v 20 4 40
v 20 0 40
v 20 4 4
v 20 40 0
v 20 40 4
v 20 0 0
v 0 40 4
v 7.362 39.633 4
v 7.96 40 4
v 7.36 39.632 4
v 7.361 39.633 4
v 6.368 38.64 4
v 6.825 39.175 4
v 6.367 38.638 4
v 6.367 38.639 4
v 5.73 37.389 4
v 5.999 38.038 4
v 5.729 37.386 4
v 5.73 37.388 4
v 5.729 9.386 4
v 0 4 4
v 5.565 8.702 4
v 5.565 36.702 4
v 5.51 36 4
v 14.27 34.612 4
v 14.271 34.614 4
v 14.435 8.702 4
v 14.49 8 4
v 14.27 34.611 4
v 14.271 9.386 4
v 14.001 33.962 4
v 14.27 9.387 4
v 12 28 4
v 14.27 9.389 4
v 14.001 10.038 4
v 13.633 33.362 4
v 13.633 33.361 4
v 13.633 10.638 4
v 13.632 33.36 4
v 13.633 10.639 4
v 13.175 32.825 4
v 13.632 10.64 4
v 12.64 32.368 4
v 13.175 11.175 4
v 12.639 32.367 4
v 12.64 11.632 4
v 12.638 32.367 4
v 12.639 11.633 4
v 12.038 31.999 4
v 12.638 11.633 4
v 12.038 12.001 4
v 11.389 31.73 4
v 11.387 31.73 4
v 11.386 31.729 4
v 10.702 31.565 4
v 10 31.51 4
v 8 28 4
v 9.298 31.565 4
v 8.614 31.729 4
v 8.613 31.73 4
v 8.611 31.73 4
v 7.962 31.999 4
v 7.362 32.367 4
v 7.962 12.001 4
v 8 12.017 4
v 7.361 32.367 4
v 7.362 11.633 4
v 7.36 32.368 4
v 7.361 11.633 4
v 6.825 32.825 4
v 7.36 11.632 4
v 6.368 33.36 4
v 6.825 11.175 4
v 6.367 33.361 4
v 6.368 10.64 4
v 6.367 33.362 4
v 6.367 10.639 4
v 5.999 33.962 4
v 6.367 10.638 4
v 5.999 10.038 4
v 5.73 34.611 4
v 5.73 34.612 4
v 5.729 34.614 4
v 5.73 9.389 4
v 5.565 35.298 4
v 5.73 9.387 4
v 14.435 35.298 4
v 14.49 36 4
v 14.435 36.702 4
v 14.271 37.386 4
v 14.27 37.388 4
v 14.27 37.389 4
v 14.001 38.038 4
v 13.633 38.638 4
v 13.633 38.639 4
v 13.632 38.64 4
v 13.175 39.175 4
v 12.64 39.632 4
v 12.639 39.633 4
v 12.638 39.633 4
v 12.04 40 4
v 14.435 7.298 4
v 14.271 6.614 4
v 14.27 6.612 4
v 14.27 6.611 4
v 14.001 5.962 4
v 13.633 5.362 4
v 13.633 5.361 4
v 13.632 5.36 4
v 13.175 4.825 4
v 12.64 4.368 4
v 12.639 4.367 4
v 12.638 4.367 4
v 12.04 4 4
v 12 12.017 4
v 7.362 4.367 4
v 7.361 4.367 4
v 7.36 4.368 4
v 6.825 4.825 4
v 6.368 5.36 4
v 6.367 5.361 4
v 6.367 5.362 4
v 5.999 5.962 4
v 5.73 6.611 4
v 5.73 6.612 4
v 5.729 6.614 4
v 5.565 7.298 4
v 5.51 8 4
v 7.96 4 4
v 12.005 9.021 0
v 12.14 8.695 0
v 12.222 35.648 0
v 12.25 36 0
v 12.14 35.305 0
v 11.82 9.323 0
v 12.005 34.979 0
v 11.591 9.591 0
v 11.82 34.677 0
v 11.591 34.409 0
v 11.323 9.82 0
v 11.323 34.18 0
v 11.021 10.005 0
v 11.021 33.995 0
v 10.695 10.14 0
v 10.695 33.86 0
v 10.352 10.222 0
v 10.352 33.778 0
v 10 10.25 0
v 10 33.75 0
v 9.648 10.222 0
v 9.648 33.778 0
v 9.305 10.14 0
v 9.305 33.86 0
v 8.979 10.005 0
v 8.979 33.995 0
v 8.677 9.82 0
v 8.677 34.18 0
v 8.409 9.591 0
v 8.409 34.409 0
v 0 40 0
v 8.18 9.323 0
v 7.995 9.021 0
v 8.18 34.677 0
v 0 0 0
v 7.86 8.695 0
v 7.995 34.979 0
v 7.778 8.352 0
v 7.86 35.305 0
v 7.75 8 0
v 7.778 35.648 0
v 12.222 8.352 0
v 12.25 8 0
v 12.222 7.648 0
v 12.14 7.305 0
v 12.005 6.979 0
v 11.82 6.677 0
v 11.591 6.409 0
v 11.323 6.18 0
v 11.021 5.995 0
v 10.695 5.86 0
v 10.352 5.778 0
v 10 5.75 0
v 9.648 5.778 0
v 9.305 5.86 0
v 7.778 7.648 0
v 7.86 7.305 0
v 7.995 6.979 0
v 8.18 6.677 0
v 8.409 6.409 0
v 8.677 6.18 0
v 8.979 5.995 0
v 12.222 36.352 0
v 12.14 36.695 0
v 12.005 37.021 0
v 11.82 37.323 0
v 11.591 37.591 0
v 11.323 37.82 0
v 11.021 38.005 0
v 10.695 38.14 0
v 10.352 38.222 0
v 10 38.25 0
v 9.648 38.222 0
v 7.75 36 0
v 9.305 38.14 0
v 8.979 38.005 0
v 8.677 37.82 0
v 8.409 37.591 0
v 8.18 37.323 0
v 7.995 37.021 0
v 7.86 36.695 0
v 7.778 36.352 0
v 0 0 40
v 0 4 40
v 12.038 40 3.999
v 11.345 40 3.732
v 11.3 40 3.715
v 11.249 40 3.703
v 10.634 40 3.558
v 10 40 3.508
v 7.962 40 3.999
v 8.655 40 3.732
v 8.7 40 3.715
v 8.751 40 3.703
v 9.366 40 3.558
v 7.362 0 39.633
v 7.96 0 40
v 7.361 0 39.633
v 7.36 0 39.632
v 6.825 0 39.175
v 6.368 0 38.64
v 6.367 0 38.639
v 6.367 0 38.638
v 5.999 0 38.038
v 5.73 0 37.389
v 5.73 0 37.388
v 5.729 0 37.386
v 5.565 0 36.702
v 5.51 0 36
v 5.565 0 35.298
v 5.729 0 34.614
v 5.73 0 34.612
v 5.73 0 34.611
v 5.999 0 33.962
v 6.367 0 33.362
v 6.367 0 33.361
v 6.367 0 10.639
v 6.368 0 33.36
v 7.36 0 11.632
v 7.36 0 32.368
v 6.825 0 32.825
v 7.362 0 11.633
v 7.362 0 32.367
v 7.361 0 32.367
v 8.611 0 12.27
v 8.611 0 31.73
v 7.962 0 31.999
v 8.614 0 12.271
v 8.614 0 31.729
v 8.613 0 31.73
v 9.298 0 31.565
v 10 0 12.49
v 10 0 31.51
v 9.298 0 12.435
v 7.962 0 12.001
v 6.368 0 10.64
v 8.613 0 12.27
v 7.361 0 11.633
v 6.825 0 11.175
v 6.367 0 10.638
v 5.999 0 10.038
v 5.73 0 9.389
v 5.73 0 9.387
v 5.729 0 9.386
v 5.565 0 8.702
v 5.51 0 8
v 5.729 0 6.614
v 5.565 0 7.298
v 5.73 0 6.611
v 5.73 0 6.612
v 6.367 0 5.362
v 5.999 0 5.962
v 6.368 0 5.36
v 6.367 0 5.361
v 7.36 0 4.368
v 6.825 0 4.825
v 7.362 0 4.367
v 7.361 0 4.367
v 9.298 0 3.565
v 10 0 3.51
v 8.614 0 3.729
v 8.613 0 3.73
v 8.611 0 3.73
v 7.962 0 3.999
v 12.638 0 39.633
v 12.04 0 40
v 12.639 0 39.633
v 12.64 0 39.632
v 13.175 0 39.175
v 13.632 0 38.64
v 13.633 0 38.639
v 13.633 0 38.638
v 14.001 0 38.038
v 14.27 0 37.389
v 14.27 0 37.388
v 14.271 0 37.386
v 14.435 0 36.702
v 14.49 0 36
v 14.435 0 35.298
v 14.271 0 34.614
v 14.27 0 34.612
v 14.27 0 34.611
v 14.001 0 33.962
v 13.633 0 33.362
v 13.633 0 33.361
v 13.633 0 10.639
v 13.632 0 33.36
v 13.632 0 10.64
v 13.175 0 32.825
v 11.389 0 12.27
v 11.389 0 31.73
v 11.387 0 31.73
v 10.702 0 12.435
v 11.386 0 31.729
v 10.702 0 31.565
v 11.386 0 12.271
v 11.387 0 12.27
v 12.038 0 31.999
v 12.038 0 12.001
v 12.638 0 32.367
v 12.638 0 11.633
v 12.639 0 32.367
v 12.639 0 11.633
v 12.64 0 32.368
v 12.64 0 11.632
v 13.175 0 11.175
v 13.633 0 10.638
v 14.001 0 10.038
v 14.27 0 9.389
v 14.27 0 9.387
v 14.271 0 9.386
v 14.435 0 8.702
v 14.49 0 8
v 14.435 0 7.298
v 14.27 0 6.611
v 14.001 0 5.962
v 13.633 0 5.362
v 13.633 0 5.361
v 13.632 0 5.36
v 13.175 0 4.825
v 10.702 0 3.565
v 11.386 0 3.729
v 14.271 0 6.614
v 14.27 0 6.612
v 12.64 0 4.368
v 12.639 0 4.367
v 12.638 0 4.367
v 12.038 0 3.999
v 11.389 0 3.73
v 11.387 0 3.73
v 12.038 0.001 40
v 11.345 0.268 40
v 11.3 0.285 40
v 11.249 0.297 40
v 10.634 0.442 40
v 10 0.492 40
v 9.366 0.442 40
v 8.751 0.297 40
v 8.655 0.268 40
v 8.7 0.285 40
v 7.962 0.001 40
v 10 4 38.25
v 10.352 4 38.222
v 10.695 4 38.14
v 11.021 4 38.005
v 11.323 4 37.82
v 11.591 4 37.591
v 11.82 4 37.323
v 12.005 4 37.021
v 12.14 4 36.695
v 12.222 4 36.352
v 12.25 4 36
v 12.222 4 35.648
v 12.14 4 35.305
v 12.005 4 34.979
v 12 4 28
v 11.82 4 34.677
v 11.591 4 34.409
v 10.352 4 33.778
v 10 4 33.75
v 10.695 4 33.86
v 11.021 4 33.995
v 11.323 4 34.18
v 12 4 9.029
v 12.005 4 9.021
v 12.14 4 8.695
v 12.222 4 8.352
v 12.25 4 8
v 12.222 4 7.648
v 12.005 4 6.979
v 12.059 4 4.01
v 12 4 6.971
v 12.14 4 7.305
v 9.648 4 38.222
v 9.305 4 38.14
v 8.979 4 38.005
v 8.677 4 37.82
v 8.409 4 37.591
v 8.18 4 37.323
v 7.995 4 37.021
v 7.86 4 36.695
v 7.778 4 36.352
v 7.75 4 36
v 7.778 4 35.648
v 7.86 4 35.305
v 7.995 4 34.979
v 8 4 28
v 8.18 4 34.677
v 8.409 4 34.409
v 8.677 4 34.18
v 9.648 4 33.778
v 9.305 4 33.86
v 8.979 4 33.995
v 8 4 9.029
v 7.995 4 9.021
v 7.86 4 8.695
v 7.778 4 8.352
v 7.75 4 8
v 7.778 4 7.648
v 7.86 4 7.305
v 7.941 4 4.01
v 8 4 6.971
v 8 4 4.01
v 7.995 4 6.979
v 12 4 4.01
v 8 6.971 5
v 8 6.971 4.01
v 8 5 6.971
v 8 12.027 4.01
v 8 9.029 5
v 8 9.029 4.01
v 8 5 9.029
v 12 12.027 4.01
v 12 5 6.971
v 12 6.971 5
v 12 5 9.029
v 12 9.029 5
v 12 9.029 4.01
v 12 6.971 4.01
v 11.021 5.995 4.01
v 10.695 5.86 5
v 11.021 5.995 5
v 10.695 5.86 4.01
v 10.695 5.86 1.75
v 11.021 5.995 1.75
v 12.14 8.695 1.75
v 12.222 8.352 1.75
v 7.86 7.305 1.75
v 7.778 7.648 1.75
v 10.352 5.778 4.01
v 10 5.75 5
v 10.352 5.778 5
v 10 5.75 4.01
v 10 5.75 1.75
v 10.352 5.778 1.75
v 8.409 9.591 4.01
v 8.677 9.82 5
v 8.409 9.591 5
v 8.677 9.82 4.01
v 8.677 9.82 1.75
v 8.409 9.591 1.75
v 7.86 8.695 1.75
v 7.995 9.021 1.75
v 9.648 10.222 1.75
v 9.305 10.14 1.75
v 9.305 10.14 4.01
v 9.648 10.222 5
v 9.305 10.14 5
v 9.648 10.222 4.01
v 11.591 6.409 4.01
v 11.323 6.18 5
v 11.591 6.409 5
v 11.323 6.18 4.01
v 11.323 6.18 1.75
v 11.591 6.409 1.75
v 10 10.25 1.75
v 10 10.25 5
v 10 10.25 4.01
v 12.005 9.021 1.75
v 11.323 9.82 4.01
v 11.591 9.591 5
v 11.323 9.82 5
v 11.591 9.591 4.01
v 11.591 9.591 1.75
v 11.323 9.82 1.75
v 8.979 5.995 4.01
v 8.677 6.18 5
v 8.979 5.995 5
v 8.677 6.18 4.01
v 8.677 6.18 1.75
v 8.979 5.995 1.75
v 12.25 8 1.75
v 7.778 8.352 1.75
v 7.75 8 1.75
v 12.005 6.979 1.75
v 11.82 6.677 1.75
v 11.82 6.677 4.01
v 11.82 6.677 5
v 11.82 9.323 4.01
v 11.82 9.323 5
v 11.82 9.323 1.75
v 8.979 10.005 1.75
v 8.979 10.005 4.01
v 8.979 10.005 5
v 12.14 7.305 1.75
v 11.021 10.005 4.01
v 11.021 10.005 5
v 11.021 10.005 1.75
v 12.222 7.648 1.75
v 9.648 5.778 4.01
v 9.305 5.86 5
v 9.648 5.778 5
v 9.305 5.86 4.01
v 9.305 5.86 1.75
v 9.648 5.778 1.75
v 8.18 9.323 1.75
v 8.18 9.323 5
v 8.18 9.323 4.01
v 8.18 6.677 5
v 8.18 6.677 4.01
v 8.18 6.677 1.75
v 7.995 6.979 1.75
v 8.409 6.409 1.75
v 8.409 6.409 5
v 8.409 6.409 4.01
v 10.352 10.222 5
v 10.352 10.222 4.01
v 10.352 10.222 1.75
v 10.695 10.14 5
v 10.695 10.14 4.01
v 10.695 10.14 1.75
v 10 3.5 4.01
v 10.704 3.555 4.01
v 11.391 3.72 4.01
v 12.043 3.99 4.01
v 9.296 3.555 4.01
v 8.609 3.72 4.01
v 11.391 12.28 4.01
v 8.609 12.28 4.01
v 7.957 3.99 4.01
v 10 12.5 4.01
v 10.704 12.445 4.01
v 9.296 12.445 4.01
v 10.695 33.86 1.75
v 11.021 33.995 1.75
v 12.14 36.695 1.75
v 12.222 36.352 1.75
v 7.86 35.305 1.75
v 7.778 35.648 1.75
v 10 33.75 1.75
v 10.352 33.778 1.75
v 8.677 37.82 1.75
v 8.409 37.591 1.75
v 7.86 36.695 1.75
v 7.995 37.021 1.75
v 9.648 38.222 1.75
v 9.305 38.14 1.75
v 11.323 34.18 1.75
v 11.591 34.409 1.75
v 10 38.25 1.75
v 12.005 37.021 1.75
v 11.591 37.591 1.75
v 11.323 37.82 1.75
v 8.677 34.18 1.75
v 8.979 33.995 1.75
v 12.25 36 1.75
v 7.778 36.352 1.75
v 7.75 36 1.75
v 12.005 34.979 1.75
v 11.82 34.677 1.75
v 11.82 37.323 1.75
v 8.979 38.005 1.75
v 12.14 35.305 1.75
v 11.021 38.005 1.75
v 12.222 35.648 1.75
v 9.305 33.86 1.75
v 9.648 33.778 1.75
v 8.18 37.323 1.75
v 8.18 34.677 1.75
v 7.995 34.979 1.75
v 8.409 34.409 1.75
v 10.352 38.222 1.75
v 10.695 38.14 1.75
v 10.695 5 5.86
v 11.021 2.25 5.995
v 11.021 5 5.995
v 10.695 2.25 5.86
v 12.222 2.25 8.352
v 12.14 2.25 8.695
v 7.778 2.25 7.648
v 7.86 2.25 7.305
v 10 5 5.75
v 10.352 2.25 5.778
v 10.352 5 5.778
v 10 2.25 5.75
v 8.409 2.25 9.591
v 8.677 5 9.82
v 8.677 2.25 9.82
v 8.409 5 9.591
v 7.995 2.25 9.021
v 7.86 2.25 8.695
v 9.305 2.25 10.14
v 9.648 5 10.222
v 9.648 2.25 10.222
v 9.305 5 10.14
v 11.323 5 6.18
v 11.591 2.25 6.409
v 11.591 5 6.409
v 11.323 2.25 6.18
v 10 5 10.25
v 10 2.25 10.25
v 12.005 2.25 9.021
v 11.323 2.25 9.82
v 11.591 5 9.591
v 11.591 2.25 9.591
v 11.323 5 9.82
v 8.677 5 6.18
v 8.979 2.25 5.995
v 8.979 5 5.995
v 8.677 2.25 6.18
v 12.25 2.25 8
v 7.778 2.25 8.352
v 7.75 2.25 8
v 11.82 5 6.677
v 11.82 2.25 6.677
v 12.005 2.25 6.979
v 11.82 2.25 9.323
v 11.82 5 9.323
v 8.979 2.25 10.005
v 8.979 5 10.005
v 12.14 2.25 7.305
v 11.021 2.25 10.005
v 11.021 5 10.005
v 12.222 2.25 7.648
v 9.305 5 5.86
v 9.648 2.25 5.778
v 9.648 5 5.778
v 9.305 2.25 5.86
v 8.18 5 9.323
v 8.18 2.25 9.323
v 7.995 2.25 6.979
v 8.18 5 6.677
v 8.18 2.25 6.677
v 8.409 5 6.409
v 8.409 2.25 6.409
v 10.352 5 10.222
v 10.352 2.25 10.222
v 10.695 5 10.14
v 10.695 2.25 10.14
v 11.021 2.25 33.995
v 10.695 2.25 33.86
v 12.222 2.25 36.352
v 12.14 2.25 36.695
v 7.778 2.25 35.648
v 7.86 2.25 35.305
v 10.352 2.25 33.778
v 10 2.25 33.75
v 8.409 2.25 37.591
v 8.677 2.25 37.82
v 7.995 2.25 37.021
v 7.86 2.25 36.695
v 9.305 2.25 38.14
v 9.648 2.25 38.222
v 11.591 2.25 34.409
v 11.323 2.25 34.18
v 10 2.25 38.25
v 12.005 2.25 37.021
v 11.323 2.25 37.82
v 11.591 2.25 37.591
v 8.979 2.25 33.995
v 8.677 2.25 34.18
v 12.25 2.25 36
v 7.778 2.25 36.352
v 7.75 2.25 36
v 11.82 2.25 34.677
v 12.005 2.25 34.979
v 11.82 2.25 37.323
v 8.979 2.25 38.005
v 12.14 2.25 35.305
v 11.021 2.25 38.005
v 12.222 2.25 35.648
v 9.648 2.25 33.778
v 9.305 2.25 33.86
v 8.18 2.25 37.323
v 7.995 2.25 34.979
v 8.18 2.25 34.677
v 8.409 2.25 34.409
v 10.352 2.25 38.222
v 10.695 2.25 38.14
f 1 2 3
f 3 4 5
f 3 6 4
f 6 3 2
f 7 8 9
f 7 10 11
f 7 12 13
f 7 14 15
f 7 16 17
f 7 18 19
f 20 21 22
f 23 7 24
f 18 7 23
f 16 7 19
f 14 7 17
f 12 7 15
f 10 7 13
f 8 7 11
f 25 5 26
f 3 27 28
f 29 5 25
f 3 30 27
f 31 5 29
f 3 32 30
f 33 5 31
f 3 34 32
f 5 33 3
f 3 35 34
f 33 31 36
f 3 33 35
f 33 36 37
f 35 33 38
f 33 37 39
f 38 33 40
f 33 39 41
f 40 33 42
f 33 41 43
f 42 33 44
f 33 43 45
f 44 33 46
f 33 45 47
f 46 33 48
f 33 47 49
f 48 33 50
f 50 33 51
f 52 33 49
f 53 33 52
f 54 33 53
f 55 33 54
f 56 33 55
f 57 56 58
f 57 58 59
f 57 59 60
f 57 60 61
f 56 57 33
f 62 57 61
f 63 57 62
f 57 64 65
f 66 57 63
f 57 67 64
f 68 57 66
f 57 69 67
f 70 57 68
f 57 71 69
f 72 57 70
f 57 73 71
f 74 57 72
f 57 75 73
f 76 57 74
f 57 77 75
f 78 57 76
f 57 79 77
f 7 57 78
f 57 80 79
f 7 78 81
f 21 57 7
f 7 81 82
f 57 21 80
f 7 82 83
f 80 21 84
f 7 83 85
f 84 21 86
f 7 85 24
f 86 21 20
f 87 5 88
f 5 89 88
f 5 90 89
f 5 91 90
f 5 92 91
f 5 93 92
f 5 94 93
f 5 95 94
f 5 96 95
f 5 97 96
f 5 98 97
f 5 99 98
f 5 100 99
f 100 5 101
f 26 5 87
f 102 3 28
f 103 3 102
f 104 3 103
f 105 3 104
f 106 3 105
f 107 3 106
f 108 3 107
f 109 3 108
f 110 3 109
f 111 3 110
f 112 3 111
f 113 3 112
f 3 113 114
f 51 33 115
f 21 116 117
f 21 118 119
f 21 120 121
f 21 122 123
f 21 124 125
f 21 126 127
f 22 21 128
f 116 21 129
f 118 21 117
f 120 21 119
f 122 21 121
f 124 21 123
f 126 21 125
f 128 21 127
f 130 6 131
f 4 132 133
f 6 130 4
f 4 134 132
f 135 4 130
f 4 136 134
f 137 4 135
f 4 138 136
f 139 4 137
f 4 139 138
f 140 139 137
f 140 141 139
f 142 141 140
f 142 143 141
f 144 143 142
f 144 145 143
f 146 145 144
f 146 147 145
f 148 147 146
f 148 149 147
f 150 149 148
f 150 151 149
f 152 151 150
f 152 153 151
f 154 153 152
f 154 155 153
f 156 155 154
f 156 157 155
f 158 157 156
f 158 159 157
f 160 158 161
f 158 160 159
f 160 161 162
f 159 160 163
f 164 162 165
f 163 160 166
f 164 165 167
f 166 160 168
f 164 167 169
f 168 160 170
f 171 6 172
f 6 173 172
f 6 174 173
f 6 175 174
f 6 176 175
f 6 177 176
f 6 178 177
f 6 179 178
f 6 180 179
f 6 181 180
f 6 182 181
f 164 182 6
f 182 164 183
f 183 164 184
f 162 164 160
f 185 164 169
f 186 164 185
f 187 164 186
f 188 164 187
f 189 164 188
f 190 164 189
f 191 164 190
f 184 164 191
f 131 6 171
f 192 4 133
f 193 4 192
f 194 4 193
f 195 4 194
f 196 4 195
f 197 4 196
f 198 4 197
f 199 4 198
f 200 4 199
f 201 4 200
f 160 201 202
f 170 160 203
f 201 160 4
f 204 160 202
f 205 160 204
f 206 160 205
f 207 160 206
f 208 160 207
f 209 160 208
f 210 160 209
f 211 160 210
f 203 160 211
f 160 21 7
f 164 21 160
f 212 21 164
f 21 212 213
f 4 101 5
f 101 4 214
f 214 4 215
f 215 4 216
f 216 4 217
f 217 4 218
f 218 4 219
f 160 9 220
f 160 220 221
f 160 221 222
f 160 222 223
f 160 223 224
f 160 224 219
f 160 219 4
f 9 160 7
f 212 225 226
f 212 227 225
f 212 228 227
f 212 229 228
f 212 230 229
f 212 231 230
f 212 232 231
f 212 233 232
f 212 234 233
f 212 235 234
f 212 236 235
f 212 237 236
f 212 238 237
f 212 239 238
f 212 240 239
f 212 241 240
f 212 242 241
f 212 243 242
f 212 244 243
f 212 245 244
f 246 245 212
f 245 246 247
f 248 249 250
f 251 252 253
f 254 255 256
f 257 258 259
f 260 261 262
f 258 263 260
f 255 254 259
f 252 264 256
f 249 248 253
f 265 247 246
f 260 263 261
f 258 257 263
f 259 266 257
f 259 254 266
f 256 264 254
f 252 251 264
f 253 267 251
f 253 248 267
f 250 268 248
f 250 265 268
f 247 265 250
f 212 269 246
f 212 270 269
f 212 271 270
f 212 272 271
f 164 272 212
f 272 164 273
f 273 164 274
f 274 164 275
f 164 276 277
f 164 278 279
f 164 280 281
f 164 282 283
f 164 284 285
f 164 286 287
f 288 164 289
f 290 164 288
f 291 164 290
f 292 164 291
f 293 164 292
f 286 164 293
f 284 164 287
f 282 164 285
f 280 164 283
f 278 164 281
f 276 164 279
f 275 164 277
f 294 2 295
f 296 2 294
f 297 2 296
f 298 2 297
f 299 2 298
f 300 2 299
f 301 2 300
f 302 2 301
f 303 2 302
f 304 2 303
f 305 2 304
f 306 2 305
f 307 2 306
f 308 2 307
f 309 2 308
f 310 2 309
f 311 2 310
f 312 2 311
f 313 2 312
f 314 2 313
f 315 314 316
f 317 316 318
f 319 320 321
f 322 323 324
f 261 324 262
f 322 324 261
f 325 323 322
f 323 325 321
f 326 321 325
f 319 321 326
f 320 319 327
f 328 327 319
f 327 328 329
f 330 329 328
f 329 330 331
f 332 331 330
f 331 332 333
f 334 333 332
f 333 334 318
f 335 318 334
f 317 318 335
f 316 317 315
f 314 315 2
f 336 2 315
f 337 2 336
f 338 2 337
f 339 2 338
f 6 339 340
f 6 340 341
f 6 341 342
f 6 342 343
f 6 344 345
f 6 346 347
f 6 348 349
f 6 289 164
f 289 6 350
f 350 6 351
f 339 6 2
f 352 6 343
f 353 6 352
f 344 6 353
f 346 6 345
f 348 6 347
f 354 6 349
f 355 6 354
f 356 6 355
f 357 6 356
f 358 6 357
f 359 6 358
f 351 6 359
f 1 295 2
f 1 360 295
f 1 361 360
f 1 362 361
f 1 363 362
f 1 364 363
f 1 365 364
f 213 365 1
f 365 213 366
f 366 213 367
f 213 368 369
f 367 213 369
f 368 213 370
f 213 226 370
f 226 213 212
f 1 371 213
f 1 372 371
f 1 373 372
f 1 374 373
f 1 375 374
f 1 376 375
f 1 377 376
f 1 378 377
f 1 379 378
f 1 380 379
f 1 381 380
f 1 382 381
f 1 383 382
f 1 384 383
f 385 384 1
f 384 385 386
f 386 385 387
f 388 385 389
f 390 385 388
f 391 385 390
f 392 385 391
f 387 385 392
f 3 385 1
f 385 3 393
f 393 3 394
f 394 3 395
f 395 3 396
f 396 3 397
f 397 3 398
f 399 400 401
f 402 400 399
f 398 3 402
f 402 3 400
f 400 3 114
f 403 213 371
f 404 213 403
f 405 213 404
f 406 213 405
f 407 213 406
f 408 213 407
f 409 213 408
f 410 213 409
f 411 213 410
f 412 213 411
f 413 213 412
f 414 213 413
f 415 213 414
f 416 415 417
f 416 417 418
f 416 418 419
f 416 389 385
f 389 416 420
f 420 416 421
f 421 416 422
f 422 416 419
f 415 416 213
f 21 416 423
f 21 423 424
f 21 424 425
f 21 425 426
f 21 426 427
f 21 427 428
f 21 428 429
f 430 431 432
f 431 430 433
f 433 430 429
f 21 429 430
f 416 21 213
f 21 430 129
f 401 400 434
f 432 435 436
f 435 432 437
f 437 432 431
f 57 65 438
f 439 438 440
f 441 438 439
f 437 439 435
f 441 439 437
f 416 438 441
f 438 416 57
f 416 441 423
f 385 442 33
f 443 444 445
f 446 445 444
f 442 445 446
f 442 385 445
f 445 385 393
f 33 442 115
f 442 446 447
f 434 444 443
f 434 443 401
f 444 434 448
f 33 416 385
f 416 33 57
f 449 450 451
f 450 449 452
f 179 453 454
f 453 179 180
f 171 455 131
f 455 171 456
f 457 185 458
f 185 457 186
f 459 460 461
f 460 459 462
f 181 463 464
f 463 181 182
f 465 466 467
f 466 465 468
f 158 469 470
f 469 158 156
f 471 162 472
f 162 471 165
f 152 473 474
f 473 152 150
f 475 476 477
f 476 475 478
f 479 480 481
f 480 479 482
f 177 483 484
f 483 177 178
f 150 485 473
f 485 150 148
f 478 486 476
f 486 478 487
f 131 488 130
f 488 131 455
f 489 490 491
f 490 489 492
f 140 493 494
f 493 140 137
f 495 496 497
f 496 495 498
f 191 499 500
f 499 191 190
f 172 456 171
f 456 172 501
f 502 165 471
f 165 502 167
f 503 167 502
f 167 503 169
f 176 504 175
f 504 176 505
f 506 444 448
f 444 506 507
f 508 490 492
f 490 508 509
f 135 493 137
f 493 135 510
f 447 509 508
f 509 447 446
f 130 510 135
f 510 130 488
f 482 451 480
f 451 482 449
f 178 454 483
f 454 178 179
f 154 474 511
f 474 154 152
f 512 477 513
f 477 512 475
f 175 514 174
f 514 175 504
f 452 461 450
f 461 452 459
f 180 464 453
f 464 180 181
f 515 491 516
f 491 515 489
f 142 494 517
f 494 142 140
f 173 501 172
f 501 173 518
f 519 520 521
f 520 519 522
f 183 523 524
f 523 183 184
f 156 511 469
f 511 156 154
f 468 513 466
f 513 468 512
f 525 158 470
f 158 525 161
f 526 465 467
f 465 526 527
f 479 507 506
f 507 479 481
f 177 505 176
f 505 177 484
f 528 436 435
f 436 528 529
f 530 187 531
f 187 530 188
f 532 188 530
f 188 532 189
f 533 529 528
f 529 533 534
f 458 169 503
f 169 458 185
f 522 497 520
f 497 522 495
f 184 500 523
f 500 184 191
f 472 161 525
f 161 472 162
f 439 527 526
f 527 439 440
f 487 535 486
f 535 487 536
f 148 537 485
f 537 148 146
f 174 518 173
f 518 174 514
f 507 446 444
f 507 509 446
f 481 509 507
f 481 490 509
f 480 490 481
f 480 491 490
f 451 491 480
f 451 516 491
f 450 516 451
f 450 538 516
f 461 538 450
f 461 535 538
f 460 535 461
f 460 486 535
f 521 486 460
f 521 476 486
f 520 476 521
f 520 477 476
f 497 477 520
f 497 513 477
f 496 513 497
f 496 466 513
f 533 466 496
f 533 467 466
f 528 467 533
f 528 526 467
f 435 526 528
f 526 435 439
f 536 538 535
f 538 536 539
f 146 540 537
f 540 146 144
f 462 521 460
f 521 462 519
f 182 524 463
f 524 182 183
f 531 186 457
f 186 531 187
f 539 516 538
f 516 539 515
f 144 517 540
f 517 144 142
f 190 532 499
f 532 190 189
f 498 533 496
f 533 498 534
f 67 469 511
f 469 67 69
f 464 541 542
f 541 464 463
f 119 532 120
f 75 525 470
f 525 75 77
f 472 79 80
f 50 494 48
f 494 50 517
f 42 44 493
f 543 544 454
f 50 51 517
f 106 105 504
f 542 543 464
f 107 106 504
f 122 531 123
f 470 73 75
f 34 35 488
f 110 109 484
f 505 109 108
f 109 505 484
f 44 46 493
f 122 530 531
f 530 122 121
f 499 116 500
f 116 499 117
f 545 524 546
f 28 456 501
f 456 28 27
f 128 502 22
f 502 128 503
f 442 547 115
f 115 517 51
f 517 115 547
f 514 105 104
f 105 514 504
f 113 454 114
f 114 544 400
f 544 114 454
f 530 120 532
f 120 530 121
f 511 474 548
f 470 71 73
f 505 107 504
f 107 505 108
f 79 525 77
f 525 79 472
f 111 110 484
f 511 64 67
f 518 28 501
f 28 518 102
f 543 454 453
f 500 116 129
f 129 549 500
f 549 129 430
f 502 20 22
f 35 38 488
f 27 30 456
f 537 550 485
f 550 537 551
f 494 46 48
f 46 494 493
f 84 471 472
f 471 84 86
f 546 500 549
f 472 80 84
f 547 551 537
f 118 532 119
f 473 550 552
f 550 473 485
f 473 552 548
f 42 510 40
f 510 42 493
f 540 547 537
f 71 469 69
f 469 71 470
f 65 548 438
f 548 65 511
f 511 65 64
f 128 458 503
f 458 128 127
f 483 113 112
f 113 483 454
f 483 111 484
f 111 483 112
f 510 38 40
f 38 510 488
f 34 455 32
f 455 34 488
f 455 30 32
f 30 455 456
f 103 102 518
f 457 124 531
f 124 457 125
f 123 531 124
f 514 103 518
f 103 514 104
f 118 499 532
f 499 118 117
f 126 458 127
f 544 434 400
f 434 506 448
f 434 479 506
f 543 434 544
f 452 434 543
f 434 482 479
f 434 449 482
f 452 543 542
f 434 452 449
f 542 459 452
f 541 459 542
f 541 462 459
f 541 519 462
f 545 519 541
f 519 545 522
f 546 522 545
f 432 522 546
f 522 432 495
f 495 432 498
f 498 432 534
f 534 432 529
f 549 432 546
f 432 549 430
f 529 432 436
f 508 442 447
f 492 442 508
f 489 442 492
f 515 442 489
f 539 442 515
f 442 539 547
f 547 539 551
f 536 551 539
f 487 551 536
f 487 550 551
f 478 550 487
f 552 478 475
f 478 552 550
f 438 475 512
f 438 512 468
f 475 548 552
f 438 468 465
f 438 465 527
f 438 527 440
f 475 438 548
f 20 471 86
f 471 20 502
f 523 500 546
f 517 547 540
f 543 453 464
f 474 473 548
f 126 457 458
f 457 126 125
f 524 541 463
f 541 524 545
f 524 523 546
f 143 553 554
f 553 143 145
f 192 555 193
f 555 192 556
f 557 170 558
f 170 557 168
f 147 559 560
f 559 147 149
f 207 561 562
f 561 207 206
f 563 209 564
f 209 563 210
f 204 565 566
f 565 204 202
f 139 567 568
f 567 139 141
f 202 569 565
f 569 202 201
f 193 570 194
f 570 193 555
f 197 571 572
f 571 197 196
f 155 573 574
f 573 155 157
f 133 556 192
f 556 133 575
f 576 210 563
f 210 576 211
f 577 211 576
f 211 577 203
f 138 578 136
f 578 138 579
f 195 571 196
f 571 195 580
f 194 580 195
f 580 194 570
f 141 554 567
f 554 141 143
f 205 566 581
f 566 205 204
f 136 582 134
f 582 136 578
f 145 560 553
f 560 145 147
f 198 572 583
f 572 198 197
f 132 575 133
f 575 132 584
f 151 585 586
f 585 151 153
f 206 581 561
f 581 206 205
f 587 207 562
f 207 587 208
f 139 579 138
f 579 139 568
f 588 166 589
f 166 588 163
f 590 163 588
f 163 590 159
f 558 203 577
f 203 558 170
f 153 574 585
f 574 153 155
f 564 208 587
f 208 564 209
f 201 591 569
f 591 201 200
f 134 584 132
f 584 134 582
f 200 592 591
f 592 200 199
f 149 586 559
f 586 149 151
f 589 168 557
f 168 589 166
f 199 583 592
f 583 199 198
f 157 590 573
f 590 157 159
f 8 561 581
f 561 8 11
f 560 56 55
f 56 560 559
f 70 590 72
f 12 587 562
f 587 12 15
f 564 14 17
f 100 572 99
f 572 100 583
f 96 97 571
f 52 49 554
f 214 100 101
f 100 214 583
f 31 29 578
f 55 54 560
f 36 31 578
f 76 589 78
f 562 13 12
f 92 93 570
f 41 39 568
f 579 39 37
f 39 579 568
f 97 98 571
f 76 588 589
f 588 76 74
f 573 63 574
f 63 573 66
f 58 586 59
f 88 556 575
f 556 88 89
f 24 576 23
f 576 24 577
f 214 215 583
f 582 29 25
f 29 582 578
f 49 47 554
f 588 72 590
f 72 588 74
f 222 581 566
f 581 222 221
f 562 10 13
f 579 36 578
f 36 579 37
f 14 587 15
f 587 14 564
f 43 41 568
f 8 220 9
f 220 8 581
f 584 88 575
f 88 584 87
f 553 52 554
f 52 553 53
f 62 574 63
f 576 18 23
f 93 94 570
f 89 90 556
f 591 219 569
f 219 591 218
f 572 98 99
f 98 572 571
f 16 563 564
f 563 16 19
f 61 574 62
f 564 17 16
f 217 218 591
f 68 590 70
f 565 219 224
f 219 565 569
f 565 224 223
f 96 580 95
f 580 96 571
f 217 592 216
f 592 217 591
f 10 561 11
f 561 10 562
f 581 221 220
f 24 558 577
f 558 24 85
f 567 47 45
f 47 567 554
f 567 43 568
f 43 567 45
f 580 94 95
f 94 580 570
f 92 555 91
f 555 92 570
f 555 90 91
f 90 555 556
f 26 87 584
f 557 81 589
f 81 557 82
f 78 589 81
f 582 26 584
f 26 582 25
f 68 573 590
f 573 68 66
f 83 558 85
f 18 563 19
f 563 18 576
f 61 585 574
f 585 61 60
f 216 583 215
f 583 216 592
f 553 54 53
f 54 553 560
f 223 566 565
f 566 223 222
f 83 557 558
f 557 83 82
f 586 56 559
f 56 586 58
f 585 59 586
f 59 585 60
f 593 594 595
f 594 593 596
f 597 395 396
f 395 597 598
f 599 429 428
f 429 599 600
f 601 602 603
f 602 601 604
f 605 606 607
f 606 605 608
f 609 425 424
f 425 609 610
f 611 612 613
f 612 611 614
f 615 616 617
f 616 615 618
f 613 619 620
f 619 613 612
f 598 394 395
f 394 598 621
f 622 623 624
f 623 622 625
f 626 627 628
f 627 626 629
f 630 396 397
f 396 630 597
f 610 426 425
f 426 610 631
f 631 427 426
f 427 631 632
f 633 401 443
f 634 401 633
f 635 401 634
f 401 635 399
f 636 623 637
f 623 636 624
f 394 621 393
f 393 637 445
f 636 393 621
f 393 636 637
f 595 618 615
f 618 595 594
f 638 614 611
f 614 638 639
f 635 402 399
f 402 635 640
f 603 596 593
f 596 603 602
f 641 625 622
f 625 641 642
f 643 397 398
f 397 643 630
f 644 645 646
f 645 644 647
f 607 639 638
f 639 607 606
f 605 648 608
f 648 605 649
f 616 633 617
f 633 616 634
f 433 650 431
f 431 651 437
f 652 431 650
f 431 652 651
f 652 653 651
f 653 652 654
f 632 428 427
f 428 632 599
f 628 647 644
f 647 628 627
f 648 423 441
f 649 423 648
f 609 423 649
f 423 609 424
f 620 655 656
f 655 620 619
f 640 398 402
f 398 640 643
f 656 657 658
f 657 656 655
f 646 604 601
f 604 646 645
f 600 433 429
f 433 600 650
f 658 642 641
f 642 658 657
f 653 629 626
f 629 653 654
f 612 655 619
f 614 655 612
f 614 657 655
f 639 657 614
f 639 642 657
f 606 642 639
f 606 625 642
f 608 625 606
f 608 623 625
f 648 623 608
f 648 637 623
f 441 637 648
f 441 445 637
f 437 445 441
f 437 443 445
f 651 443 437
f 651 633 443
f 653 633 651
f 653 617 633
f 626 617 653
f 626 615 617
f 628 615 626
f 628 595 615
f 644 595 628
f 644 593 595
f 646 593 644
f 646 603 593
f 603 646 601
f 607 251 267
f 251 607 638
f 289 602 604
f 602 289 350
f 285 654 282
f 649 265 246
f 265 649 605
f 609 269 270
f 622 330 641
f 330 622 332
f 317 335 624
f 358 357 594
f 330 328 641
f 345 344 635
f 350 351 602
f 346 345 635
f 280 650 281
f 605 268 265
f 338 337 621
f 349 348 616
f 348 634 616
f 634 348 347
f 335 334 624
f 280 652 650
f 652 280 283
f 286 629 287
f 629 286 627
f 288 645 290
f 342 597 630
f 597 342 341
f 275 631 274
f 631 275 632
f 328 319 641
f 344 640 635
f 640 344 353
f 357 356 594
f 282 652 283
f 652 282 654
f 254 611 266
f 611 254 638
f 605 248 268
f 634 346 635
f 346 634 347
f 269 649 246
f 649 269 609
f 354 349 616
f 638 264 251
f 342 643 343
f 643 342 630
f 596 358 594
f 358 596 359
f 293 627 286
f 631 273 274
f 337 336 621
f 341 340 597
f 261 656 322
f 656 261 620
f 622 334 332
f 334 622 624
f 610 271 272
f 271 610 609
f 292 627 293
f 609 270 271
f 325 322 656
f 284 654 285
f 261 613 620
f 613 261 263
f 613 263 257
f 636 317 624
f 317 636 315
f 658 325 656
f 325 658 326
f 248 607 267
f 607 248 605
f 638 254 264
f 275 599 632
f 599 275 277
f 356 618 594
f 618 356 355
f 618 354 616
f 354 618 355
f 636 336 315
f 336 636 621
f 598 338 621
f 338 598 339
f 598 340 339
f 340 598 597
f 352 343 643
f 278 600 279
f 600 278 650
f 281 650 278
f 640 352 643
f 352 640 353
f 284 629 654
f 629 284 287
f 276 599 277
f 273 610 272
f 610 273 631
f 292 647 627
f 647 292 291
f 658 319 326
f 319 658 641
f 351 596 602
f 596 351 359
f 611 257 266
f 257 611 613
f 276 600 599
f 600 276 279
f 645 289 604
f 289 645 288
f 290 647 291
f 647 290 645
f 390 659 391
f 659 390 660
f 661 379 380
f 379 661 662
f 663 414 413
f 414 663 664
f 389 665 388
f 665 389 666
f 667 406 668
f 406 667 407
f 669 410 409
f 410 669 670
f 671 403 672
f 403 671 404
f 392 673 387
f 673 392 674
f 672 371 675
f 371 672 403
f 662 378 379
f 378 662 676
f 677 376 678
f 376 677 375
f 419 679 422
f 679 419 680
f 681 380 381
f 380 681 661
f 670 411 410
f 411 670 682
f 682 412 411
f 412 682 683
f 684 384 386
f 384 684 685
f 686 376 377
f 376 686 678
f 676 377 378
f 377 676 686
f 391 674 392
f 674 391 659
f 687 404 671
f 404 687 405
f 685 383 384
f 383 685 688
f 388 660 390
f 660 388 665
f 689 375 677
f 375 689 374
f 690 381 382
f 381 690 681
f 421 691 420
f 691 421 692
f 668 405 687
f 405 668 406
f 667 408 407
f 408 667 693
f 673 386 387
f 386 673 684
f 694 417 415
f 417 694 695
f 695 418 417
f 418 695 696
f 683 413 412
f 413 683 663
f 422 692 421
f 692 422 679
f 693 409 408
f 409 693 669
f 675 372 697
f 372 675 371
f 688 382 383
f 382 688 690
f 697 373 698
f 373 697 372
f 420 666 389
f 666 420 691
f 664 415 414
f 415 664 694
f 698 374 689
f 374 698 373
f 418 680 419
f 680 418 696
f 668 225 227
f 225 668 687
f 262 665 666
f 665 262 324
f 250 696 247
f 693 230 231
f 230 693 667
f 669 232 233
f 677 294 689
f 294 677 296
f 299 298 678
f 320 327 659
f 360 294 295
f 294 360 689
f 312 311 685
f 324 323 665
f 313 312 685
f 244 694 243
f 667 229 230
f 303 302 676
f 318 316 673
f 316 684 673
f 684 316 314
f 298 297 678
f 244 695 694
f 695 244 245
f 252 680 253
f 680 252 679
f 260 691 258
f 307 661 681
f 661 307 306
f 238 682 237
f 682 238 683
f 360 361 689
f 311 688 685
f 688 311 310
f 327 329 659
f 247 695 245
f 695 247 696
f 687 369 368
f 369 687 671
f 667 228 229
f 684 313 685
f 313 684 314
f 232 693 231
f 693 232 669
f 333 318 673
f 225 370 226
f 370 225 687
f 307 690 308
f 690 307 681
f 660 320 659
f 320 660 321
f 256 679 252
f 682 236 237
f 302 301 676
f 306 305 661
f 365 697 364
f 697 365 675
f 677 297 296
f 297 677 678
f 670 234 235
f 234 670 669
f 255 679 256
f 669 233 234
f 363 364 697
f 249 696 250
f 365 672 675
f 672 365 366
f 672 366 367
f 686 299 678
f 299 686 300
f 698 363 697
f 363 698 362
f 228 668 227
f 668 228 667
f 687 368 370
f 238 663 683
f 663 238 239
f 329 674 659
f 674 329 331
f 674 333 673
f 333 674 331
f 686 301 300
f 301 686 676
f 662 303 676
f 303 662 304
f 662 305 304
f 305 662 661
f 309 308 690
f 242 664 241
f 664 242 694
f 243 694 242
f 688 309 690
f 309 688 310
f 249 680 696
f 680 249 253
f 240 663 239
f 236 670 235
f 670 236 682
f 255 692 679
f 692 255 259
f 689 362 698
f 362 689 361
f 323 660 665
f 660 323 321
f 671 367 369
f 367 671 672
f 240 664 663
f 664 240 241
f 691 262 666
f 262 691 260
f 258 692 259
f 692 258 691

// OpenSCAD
// Suporte em L, cantoneira e mão francesa — modelo próprio do Multiferramenta 3D
tipo = "suporte";        // suporte (com reforço) | cantoneira (perfil comprido) | mao_francesa
aba_a = 40; aba_b = 40;  // comprimento de cada aba
largura = 20;            // largura do suporte (no perfil: comprimento total = comprimento)
comprimento = 100;       // só cantoneira
esp = 4;
furo = 4.5; escareado = true; furos_por_aba = 2;
parte = "suporte";
$fn = 40;

module furo_escareado(h) { translate([0, 0, -1]) cylinder(d = furo, h = h + 2); if (escareado) translate([0, 0, h - furo * 0.5]) cylinder(d1 = furo, d2 = furo * 2, h = furo * 0.5 + 0.01); }
L = tipo == "cantoneira" ? comprimento : largura;
module corpo() {
  cube([L, aba_a, esp]);                                    // aba A (deitada, no eixo Y)
  cube([L, esp, aba_b]);                                    // aba B (em pé, no eixo Z)
  if (tipo == "suporte") for (x = [L / 2 - esp / 2]) translate([x, 0, 0]) rotate([90, 0, 90]) linear_extrude(esp)    // reforço triangular
    polygon([[esp, esp], [min(aba_a, aba_b) * 0.7, esp], [esp, min(aba_a, aba_b) * 0.7]]);
  if (tipo == "mao_francesa") translate([0, 0, 0]) rotate([90, 0, 90]) linear_extrude(L) difference() {
    polygon([[0, 0], [aba_a, 0], [aba_a, esp], [esp, aba_b], [0, aba_b]]);
    offset(r = -esp) polygon([[0, 0], [aba_a, 0], [aba_a, esp], [esp, aba_b], [0, aba_b]]);
  }
}
nx = tipo == "cantoneira" ? max(1, floor(comprimento / 50)) : 1;
if (parte == "suporte") difference() {
  corpo();
  for (j = [0 : nx - 1]) let(x = L * (j + 0.5) / nx) {
    for (i = [1 : furos_por_aba]) let(y = esp + 4 + (aba_a - esp - 8) * (furos_por_aba == 1 ? 0.5 : (i - 1) / (furos_por_aba - 1))) translate([x, y, 0]) furo_escareado(esp);
    for (i = [1 : furos_por_aba]) let(z = esp + 4 + (aba_b - esp - 8) * (furos_por_aba == 1 ? 0.5 : (i - 1) / (furos_por_aba - 1))) translate([x, esp, z]) rotate([90, 0, 0]) furo_escareado(esp);
  }
}
